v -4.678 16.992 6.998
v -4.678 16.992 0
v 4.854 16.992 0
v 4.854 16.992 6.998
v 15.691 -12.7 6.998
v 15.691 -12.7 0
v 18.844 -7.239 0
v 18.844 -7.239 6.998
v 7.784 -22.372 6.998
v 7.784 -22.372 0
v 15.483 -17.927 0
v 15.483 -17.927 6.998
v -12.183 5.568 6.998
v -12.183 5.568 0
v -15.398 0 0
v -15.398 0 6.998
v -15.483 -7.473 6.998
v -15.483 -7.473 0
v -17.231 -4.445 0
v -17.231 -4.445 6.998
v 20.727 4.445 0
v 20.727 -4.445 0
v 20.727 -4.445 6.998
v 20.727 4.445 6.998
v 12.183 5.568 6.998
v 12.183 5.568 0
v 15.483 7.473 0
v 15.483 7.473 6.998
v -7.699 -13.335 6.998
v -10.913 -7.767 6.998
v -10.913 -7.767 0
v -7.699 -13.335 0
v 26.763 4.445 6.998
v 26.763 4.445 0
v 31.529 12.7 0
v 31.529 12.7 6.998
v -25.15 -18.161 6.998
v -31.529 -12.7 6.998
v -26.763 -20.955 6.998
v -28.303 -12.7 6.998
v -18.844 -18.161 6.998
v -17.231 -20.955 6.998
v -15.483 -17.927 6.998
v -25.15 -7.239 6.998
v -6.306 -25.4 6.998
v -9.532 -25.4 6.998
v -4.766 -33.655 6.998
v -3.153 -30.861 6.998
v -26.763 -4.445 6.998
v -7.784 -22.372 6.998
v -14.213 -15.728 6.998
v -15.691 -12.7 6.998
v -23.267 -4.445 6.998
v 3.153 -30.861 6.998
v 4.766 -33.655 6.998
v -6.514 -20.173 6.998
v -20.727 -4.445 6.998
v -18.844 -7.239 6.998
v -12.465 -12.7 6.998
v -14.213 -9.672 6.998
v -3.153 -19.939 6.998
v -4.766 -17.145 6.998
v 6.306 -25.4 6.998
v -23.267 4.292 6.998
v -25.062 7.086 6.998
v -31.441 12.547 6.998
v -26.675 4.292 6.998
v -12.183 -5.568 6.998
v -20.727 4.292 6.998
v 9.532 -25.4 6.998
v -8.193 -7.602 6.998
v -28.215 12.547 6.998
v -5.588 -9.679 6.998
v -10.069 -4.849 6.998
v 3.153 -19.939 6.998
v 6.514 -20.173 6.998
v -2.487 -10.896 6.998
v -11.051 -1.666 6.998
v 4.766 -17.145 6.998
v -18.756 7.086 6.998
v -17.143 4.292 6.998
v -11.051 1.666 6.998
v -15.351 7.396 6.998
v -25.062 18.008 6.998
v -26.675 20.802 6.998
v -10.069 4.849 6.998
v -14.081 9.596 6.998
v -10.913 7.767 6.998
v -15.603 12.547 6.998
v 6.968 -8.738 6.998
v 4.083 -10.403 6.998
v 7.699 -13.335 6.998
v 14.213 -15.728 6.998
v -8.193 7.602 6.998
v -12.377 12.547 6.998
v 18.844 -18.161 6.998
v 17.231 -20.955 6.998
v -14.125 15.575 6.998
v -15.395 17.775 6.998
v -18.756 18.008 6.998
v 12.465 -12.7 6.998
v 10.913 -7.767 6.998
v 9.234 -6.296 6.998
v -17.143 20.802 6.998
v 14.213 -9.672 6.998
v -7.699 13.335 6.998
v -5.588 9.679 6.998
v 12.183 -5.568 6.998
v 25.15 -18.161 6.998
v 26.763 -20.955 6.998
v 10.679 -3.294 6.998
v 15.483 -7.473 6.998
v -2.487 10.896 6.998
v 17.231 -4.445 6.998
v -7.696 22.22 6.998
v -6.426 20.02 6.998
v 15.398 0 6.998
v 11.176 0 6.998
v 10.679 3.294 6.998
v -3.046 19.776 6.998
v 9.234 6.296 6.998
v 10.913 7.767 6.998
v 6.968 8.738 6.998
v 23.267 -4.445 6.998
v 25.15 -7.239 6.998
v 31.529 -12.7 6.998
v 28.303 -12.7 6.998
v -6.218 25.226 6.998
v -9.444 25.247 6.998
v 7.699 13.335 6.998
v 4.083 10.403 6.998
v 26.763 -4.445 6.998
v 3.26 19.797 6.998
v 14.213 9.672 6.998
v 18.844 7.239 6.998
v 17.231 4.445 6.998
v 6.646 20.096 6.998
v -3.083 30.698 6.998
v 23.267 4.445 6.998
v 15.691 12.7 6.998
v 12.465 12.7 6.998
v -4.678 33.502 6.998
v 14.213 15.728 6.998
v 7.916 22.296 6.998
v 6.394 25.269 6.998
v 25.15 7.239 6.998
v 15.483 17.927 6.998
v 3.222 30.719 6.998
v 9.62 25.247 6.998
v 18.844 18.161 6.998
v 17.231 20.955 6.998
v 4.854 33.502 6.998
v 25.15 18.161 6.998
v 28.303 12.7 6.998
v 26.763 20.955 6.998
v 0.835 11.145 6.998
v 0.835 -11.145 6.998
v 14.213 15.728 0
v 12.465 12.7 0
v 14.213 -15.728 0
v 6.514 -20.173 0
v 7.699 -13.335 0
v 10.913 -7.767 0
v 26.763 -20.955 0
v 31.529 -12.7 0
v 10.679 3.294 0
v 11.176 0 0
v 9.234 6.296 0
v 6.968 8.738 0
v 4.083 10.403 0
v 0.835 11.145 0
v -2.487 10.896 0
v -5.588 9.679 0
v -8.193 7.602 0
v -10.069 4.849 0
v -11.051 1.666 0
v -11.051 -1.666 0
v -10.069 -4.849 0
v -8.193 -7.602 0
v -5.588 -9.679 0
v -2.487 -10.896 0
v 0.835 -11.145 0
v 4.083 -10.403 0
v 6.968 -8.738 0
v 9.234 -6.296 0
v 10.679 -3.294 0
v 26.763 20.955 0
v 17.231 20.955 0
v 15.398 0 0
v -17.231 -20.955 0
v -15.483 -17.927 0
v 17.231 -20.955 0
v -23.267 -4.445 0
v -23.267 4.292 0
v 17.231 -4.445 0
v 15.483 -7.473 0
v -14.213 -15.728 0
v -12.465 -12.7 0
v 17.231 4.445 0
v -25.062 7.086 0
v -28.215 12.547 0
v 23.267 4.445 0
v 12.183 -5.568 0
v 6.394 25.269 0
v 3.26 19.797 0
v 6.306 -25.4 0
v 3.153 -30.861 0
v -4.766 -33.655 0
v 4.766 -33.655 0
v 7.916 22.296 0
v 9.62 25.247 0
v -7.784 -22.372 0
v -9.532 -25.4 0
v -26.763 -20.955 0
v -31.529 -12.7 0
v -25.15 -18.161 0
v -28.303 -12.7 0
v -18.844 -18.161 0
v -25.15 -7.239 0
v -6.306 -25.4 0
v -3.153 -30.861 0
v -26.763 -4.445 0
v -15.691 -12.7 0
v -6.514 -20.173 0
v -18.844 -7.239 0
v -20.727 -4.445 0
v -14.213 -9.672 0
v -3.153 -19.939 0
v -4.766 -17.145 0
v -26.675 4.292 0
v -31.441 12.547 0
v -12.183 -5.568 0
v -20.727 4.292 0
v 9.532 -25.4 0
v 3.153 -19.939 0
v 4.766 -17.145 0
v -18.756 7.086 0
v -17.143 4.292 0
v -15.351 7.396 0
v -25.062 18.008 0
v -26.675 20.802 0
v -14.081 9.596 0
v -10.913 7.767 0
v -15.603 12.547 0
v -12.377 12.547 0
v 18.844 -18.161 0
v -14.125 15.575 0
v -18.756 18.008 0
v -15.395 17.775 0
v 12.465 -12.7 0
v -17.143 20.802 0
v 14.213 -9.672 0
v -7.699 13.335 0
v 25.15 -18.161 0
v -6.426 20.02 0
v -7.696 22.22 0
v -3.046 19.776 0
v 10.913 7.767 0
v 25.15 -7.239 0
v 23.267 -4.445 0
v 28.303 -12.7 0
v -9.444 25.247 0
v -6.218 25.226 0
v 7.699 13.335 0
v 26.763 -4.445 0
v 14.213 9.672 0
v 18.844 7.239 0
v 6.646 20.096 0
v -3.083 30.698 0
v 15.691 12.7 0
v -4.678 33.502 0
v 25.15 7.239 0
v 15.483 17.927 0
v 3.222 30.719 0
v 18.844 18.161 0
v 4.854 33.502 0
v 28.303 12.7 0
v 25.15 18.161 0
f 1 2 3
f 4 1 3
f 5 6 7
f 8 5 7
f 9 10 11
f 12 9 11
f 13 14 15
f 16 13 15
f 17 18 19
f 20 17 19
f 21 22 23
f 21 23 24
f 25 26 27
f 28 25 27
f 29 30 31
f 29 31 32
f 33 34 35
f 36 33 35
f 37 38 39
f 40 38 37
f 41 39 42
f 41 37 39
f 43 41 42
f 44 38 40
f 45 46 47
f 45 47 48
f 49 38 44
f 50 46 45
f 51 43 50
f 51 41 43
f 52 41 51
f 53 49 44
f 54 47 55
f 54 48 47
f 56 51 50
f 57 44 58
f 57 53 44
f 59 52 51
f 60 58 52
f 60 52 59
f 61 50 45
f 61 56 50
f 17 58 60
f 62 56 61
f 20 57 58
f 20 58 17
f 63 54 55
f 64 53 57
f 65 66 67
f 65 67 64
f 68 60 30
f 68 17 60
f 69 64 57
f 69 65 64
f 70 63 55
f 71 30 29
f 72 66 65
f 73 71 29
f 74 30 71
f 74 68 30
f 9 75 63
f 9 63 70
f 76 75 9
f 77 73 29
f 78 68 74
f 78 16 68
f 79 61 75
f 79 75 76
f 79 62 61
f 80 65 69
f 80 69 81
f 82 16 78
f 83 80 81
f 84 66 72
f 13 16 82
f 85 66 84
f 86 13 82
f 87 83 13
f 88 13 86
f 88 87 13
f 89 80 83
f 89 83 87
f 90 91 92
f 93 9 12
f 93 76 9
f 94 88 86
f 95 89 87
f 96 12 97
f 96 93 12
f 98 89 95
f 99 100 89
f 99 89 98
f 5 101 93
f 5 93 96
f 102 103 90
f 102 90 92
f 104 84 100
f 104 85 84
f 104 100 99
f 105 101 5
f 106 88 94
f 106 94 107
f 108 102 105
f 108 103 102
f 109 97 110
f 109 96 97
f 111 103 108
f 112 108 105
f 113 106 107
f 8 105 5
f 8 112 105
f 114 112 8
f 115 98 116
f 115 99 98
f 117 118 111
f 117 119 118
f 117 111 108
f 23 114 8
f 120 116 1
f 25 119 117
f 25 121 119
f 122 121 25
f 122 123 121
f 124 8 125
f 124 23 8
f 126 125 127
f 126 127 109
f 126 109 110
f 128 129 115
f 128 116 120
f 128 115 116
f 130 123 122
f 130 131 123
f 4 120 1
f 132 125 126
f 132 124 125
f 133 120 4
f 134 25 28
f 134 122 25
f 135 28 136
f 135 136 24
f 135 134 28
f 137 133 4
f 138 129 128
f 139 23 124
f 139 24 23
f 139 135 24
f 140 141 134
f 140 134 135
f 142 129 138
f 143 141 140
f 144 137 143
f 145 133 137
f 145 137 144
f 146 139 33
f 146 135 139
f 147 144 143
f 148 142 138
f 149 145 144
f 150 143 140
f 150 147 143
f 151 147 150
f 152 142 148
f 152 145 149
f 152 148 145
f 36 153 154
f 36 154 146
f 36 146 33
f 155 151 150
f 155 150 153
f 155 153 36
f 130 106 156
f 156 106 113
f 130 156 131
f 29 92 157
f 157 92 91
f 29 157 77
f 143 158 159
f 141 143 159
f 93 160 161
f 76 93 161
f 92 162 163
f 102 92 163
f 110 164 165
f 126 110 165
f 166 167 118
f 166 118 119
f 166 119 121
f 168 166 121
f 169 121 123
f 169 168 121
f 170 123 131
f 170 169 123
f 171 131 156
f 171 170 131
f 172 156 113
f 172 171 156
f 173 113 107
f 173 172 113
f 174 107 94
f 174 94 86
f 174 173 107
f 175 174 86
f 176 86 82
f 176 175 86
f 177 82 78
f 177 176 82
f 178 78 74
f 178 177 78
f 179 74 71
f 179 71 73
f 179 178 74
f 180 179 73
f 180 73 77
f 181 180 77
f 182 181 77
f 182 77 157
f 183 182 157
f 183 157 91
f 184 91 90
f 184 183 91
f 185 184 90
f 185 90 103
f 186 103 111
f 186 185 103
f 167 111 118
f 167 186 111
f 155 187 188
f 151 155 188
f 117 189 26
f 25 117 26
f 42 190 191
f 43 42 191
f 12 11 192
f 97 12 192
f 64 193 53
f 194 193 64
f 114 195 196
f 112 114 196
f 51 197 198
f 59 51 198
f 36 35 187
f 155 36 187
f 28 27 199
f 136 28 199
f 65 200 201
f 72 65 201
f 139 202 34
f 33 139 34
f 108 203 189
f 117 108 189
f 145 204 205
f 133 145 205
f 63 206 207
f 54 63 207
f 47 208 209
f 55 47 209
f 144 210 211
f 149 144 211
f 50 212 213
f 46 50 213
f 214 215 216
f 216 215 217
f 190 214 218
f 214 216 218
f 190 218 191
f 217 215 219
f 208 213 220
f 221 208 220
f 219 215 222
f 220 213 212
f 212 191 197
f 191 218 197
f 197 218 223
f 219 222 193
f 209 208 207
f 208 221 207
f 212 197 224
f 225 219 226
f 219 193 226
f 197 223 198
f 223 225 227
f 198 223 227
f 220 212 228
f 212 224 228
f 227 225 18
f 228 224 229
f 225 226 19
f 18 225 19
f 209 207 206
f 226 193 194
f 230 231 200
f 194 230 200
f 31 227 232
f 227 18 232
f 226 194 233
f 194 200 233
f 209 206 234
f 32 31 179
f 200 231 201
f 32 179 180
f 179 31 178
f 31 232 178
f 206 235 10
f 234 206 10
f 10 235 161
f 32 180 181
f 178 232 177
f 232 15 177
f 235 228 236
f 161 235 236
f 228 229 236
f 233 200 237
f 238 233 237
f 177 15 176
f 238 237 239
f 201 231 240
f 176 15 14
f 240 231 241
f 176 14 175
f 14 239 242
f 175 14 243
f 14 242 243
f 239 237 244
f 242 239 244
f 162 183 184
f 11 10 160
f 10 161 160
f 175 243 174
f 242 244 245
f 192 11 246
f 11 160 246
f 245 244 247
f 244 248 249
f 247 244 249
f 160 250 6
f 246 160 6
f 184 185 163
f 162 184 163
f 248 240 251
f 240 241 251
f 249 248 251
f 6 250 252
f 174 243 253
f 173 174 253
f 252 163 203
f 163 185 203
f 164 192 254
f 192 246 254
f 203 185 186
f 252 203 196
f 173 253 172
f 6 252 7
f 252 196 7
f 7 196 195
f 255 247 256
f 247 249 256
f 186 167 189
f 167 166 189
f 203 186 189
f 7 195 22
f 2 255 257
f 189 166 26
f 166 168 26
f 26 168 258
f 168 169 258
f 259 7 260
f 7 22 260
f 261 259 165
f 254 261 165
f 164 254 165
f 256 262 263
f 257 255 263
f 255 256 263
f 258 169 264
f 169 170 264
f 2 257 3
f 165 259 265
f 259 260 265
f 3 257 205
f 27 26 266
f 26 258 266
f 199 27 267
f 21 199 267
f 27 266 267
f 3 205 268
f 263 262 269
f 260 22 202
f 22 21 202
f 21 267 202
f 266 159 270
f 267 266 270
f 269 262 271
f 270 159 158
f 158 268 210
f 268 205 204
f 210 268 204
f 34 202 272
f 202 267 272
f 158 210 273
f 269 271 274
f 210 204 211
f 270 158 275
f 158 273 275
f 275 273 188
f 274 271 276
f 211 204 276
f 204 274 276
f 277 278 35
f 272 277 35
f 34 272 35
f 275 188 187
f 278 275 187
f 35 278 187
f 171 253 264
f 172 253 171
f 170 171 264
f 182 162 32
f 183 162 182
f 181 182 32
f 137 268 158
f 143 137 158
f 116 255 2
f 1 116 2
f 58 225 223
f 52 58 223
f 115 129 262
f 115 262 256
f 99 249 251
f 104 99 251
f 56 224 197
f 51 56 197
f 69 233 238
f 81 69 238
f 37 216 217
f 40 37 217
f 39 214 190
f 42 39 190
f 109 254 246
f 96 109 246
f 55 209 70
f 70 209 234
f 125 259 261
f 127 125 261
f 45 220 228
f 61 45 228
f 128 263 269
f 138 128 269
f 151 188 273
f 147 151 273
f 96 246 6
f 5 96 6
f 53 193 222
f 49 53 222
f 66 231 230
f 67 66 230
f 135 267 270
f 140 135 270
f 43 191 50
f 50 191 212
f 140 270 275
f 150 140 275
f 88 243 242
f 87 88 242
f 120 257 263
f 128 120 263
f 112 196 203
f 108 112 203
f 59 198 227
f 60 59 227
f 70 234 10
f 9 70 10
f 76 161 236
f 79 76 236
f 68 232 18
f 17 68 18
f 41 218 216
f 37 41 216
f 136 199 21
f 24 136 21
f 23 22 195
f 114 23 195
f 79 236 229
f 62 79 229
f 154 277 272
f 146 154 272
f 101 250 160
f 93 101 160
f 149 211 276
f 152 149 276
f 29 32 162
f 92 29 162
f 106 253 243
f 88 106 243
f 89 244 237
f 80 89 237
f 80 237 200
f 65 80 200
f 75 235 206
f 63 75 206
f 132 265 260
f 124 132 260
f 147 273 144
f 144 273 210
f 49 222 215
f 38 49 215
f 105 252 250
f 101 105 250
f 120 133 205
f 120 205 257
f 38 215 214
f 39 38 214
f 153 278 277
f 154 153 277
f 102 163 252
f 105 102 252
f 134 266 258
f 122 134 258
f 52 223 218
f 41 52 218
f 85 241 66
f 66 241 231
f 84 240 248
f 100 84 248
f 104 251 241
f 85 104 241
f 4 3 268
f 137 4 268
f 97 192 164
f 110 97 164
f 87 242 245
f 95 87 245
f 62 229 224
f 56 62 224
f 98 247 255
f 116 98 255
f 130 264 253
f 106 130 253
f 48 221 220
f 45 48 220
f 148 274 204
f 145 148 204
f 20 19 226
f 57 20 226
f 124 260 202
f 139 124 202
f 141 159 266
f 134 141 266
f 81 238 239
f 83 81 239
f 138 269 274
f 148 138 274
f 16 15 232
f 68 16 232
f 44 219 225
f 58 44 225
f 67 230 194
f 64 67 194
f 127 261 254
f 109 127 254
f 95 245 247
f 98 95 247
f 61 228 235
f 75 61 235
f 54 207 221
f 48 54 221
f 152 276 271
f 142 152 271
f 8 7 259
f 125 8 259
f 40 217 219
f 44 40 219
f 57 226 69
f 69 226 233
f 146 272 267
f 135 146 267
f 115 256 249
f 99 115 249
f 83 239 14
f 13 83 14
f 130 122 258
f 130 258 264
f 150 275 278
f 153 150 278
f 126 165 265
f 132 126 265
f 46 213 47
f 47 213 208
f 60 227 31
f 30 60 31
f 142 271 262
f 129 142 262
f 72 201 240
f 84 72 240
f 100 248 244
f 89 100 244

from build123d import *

# Parameters (mm, degrees)
F0_W     = 2.54
F0_H     = 8.7372876405
F0_H_2   = 8.89
F1_DEPTH = 6.9977
F2_R     = 11.176
F3_DEPTH = 6.9977


with BuildPart() as f1:
    # F0 (on Top) → F1 (new body)
    with BuildSketch(Plane.XY):
        Polygon((-11.6335226281, 5.2501477372), (-10.3635226281, 7.4498522628), (-14.0807527651, 9.595996083), (-15.3507527651, 7.3962915574), align=None)
        Polygon((-15.3507527651, 7.3962915574), (-14.0807527651, 9.595996083), (-12.3768237899, 12.5472876405), (-14.124837026, 15.5749353777), (-14.2130055479, 15.7276477372), (-15.394837026, 17.7746399033), (-17.1428502621, 20.8022876405), (-26.6749032064, 20.8022876405), (-31.4409296786, 12.5472876405), (-26.6749032064, 4.2922876405), (-23.2670452561, 4.2922876405), (-20.7270452561, 4.2922876405), (-17.1428502621, 4.2922876405), align=None)
        Polygon((-18.7559669142, 18.0082876405), (-15.6030570942, 12.5472876405), (-18.7559669142, 7.0862876405), (-25.0617865543, 7.0862876405), (-28.2146963743, 12.5472876405), (-25.0617865543, 18.0082876405), align=None, mode=Mode.SUBTRACT)
        Polygon((14.2130055479, 9.6723522628), (10.3635226281, 7.4498522628), (11.6335226281, 5.2501477372), (15.4830055479, 7.4726477372), align=None)
        Polygon((-10.3635226281, -7.4498522628), (-11.6335226281, -5.2501477372), (-15.4830055479, -7.4726477372), (-14.2130055479, -9.6723522628), align=None)
        Polygon((-14.2130055479, 15.7276477372), (-14.124837026, 15.5749353777), (-6.4258711864, 20.0199353777), (-7.6958711864, 22.2196399033), (-15.394837026, 17.7746399033), align=None)
        Polygon((12.4649923118, 12.7), (14.2130055479, 9.6723522628), (15.4830055479, 7.4726477372), (17.231018784, 4.445), (20.7270452561, 4.445), (23.2670452561, 4.445), (26.7630717283, 4.445), (31.5290982004, 12.7), (26.7630717283, 20.955), (17.231018784, 20.955), (15.4830055479, 17.9273522628), (14.2130055479, 15.7276477372), align=None)
        Polygon((25.1499550762, 7.239), (18.8441354361, 7.239), (15.691225616, 12.7), (18.8441354361, 18.161), (25.1499550762, 18.161), (28.3028648962, 12.7), align=None, mode=Mode.SUBTRACT)
        Polygon((-14.2130055479, -9.6723522628), (-15.4830055479, -7.4726477372), (-17.231018784, -4.445), (-20.7270452561, -4.445), (-23.2670452561, -4.445), (-26.7630717283, -4.445), (-31.5290982004, -12.7), (-26.7630717283, -20.955), (-17.231018784, -20.955), (-15.4830055479, -17.9273522628), (-14.2130055479, -15.7276477372), (-12.4649923118, -12.7), align=None)
        Polygon((-25.1499550762, -7.239), (-18.8441354361, -7.239), (-15.691225616, -12.7), (-18.8441354361, -18.161), (-25.1499550762, -18.161), (-28.3028648962, -12.7), align=None, mode=Mode.SUBTRACT)
        with Locations((-21.9970452561, -0.0763561798)):
            Rectangle(F0_W, F0_H)
        Polygon((-7.6958711864, 22.2196399033), (-6.4258711864, 20.0199353777), (-4.6778579503, 16.9922876405), (-1.27, 16.9922876405), (1.27, 16.9922876405), (4.854194994, 16.9922876405), (6.6462924911, 20.0962915574), (7.9162924911, 22.295996083), (9.6202214662, 25.2472876405), (4.854194994, 33.5022876405), (-4.6778579503, 33.5022876405), (-9.4438844224, 25.2472876405), align=None)
        Polygon((6.3939514928, 25.2687924658), (3.2596837324, 19.7970718096), (-3.0460992385, 19.7755669843), (-6.217614449, 25.2257828151), (-3.0833466886, 30.6975034713), (3.2224362823, 30.7190082967), align=None, mode=Mode.SUBTRACT)
        Polygon((15.4830055479, -7.4726477372), (11.6335226281, -5.2501477372), (10.3635226281, -7.4498522628), (14.2130055479, -9.6723522628), align=None)
        Polygon((6.6462924911, 20.0962915574), (14.2130055479, 15.7276477372), (15.4830055479, 17.9273522628), (7.9162924911, 22.295996083), align=None)
        Polygon((17.231018784, -4.445), (15.4830055479, -7.4726477372), (14.2130055479, -9.6723522628), (12.4649923118, -12.7), (14.2130055479, -15.7276477372), (15.4830055479, -17.9273522628), (17.231018784, -20.955), (26.7630717283, -20.955), (31.5290982004, -12.7), (26.7630717283, -4.445), (23.2670452561, -4.445), (20.7270452561, -4.445), align=None)
        Polygon((18.8441354361, -18.161), (15.691225616, -12.7), (18.8441354361, -7.239), (25.1499550762, -7.239), (28.3028648962, -12.7), (25.1499550762, -18.161), align=None, mode=Mode.SUBTRACT)
        with Locations((21.9970452561, 0)):
            Rectangle(F0_W, F0_H_2)
        Polygon((-6.5140397082, -20.1726477372), (-14.2130055479, -15.7276477372), (-15.4830055479, -17.9273522628), (-7.7840397082, -22.3723522628), align=None)
        Polygon((-4.7660264722, -17.145), (-6.5140397082, -20.1726477372), (-7.7840397082, -22.3723522628), (-9.5320529443, -25.4), (-4.7660264722, -33.655), (4.7660264722, -33.655), (9.5320529443, -25.4), (7.7840397082, -22.3723522628), (6.5140397082, -20.1726477372), (4.7660264722, -17.145), (1.27, -17.145), (-1.27, -17.145), align=None)
        Polygon((-6.3058196401, -25.4), (-3.15290982, -19.939), (3.15290982, -19.939), (6.3058196401, -25.4), (3.15290982, -30.861), (-3.15290982, -30.861), align=None, mode=Mode.SUBTRACT)
        Polygon((15.4830055479, -17.9273522628), (14.2130055479, -15.7276477372), (6.5140397082, -20.1726477372), (7.7840397082, -22.3723522628), align=None)
    extrude(amount=F1_DEPTH)

    # F2 (on Top) → F3 (join)
    with BuildSketch(Plane.XY):
        Polygon((7.6989658396, 13.335), (-7.6989658396, 13.335), (-15.3979316793, 0), (-7.6989658396, -13.335), (7.6989658396, -13.335), (15.3979316793, 0), align=None)
        Circle(F2_R, mode=Mode.SUBTRACT)
    extrude(amount=F3_DEPTH)


solid = f1.part
